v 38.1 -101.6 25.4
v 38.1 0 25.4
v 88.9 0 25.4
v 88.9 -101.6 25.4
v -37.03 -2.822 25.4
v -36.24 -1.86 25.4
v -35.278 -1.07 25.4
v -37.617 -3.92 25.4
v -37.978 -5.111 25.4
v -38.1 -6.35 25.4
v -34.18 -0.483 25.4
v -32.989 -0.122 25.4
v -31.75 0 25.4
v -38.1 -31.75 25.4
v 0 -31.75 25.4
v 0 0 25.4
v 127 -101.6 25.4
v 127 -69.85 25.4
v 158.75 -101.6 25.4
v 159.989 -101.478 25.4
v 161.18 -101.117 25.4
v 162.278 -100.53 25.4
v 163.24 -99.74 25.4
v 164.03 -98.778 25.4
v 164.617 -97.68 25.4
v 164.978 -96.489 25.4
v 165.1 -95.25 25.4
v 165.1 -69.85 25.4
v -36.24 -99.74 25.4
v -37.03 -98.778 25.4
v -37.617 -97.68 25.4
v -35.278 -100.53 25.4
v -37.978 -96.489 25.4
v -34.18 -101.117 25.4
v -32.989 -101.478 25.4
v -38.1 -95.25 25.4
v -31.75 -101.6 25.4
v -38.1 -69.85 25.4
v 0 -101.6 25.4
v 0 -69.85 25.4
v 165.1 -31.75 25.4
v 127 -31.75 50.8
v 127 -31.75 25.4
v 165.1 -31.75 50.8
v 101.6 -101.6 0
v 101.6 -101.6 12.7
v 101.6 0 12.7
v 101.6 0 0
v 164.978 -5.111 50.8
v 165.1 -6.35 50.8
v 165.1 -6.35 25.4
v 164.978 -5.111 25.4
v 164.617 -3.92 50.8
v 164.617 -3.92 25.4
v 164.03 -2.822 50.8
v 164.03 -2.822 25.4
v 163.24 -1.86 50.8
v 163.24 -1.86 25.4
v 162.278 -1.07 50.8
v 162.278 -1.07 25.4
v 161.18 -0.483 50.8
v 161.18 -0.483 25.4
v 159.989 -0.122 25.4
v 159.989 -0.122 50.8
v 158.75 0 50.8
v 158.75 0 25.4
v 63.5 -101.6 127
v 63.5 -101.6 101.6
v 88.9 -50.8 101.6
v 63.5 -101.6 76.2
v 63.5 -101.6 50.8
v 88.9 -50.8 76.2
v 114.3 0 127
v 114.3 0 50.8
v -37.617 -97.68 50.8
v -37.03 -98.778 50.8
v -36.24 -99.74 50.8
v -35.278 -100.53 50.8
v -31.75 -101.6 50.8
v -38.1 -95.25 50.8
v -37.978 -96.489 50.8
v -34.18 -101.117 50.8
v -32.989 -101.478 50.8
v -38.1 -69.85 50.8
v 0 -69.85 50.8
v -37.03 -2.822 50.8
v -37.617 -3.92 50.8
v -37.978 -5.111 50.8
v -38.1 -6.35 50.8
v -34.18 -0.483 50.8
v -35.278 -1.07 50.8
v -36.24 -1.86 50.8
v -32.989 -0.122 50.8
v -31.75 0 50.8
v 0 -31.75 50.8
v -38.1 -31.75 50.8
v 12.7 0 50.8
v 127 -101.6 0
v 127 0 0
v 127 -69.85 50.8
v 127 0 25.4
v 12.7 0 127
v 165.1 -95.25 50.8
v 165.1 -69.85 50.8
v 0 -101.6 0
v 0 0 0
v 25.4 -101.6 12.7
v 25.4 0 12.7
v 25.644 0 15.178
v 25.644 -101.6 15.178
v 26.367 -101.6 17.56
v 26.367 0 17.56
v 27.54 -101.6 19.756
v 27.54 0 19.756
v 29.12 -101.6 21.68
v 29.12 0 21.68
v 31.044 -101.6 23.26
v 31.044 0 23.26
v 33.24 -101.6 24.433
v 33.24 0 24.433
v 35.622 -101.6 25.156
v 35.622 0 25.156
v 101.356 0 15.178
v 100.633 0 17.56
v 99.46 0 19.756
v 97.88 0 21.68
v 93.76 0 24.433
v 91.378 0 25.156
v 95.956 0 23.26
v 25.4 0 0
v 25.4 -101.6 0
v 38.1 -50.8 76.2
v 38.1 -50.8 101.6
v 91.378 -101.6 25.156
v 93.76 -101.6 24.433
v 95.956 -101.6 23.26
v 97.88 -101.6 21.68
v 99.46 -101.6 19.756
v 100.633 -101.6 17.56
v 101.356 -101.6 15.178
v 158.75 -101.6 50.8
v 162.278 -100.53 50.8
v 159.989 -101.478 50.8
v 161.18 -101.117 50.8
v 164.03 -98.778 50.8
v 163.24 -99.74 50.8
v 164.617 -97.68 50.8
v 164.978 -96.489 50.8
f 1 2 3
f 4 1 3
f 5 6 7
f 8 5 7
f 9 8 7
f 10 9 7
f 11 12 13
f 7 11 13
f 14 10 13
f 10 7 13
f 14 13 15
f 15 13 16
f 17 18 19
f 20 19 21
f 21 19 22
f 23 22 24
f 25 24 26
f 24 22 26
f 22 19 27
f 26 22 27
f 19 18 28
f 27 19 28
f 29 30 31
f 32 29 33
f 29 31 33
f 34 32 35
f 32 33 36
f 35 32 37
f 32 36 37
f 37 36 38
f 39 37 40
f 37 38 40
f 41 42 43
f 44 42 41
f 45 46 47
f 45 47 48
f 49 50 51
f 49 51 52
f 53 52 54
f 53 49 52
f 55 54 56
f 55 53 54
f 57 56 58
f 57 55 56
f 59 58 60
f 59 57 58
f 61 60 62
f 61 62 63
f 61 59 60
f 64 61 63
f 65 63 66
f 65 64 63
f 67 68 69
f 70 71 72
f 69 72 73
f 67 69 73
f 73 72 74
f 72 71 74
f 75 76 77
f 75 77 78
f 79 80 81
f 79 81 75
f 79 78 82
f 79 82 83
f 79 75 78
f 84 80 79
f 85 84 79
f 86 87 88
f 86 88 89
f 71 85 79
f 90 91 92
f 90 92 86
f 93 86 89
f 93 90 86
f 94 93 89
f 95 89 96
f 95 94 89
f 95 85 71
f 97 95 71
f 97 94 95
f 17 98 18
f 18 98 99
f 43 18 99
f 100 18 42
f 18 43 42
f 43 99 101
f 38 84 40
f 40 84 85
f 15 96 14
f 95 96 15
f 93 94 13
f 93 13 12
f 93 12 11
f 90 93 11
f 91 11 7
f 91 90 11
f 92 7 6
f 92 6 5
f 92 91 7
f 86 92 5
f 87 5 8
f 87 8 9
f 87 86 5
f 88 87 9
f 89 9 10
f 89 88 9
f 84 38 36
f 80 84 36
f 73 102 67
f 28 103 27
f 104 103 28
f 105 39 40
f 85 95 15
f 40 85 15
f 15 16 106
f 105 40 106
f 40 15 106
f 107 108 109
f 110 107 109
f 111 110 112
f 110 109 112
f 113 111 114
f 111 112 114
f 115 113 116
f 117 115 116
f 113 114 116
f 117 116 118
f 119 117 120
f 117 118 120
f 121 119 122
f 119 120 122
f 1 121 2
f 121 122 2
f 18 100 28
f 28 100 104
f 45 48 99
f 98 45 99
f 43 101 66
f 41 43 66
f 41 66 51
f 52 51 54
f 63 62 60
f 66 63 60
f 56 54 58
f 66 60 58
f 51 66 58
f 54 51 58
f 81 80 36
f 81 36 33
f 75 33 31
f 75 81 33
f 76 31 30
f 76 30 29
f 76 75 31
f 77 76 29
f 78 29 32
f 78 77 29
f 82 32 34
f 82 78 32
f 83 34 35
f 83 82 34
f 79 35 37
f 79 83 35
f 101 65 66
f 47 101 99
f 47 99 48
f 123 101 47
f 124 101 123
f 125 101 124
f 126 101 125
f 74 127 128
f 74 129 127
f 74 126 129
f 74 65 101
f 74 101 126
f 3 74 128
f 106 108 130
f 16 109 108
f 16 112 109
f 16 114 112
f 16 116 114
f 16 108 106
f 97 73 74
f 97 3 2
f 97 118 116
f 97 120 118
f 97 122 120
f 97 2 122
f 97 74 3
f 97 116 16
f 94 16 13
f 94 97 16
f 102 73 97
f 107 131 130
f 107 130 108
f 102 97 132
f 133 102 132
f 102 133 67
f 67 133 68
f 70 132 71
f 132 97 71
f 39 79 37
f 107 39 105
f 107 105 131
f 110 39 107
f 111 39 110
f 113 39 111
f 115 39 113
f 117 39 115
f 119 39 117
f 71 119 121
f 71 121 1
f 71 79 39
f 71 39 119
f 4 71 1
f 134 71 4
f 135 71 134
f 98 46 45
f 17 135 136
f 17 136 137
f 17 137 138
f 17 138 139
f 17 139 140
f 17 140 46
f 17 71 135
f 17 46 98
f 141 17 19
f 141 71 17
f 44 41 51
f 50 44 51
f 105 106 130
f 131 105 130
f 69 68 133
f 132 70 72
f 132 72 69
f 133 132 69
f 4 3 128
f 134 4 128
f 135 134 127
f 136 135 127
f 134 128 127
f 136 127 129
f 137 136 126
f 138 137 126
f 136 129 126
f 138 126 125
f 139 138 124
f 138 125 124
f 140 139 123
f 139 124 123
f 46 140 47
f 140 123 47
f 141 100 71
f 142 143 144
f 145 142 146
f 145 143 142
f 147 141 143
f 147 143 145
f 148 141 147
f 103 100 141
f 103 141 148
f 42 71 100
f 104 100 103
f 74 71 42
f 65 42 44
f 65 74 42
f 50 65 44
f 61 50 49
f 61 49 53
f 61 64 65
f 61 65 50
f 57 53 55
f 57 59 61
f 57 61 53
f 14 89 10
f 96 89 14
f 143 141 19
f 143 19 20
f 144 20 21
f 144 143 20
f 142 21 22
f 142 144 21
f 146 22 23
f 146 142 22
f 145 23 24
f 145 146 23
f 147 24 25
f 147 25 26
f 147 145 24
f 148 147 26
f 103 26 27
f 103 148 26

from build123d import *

# Parameters (mm, degrees)
F1_DEPTH = 101.6
F3_DEPTH = 25.4
F5_DEPTH = 76.2
F6_W     = 50.8
F6_H     = 25.4
F7_DEPTH = 165.101
F8_W     = 38.1
F8_H     = 38.1
F9_DEPTH = 50.801


with BuildPart() as f1:
    # F0 (on Front) → F1 (new body)
    with BuildSketch(Plane.XZ):
        with BuildLine():
            Line((127, 50.8), (0, 50.8))
            Line((0, 50.8), (0, 0))
            Line((0, 0), (25.4, 0))
            Line((25.4, 0), (25.4, 12.7))
            ThreePointArc((25.4, 12.7), (29.119744, 21.680256), (38.1, 25.4))
            Line((38.1, 25.4), (88.9, 25.4))
            ThreePointArc((88.9, 25.4), (97.880256, 21.680256), (101.6, 12.7))
            Line((101.6, 12.7), (101.6, 0))
            Line((101.6, 0), (127, 0))
            Line((127, 0), (127, 50.8))
        make_face()
    extrude(amount=F1_DEPTH)

    # F2 (on face) → F3 (join)
    with BuildSketch(Plane.XY.offset(50.8)):
        with BuildLine():
            Line((0, -101.6), (0, 0))
            Line((0, 0), (-31.75, 0))
            ThreePointArc((-31.75, 0), (-36.240128, -1.859872), (-38.1, -6.35))
            Line((-38.1, -6.35), (-38.1, -95.25))
            ThreePointArc((-38.1, -95.25), (-36.240128, -99.740128), (-31.75, -101.6))
            Line((-31.75, -101.6), (0, -101.6))
        make_face()
        with BuildLine():
            Line((127, 0), (127, -101.6))
            Line((127, -101.6), (158.75, -101.6))
            ThreePointArc((158.75, -101.6), (163.240128, -99.740128), (165.1, -95.25))
            Line((165.1, -95.25), (165.1, -6.35))
            ThreePointArc((165.1, -6.35), (163.240128, -1.859872), (158.75, 0))
            Line((158.75, 0), (127, 0))
        make_face()
    extrude(amount=-F3_DEPTH)

    # F4 (on face) → F5 (join)
    with BuildSketch(Plane.XY.offset(50.8)):
        Polygon((114.3, 0), (12.7, 0), (63.5, -101.6), align=None)
    extrude(amount=F5_DEPTH)

    # F6 (on Right) → F7 (cut, through all)
    with BuildSketch(Plane.YZ):
        with Locations((-76.2, 88.9)):
            Rectangle(F6_W, F6_H)
    extrude(amount=F7_DEPTH, mode=Mode.SUBTRACT)

    # F8 (on face) → F9 (cut, through all)
    with BuildSketch(Plane.XY.offset(50.8)):
        with Locations((146.05, -50.8)):
            Rectangle(F8_W, F8_H)
        with Locations((-19.05, -50.8)):
            Rectangle(F8_W, F8_H)
    extrude(amount=-F9_DEPTH, mode=Mode.SUBTRACT)


solid = f1.part
